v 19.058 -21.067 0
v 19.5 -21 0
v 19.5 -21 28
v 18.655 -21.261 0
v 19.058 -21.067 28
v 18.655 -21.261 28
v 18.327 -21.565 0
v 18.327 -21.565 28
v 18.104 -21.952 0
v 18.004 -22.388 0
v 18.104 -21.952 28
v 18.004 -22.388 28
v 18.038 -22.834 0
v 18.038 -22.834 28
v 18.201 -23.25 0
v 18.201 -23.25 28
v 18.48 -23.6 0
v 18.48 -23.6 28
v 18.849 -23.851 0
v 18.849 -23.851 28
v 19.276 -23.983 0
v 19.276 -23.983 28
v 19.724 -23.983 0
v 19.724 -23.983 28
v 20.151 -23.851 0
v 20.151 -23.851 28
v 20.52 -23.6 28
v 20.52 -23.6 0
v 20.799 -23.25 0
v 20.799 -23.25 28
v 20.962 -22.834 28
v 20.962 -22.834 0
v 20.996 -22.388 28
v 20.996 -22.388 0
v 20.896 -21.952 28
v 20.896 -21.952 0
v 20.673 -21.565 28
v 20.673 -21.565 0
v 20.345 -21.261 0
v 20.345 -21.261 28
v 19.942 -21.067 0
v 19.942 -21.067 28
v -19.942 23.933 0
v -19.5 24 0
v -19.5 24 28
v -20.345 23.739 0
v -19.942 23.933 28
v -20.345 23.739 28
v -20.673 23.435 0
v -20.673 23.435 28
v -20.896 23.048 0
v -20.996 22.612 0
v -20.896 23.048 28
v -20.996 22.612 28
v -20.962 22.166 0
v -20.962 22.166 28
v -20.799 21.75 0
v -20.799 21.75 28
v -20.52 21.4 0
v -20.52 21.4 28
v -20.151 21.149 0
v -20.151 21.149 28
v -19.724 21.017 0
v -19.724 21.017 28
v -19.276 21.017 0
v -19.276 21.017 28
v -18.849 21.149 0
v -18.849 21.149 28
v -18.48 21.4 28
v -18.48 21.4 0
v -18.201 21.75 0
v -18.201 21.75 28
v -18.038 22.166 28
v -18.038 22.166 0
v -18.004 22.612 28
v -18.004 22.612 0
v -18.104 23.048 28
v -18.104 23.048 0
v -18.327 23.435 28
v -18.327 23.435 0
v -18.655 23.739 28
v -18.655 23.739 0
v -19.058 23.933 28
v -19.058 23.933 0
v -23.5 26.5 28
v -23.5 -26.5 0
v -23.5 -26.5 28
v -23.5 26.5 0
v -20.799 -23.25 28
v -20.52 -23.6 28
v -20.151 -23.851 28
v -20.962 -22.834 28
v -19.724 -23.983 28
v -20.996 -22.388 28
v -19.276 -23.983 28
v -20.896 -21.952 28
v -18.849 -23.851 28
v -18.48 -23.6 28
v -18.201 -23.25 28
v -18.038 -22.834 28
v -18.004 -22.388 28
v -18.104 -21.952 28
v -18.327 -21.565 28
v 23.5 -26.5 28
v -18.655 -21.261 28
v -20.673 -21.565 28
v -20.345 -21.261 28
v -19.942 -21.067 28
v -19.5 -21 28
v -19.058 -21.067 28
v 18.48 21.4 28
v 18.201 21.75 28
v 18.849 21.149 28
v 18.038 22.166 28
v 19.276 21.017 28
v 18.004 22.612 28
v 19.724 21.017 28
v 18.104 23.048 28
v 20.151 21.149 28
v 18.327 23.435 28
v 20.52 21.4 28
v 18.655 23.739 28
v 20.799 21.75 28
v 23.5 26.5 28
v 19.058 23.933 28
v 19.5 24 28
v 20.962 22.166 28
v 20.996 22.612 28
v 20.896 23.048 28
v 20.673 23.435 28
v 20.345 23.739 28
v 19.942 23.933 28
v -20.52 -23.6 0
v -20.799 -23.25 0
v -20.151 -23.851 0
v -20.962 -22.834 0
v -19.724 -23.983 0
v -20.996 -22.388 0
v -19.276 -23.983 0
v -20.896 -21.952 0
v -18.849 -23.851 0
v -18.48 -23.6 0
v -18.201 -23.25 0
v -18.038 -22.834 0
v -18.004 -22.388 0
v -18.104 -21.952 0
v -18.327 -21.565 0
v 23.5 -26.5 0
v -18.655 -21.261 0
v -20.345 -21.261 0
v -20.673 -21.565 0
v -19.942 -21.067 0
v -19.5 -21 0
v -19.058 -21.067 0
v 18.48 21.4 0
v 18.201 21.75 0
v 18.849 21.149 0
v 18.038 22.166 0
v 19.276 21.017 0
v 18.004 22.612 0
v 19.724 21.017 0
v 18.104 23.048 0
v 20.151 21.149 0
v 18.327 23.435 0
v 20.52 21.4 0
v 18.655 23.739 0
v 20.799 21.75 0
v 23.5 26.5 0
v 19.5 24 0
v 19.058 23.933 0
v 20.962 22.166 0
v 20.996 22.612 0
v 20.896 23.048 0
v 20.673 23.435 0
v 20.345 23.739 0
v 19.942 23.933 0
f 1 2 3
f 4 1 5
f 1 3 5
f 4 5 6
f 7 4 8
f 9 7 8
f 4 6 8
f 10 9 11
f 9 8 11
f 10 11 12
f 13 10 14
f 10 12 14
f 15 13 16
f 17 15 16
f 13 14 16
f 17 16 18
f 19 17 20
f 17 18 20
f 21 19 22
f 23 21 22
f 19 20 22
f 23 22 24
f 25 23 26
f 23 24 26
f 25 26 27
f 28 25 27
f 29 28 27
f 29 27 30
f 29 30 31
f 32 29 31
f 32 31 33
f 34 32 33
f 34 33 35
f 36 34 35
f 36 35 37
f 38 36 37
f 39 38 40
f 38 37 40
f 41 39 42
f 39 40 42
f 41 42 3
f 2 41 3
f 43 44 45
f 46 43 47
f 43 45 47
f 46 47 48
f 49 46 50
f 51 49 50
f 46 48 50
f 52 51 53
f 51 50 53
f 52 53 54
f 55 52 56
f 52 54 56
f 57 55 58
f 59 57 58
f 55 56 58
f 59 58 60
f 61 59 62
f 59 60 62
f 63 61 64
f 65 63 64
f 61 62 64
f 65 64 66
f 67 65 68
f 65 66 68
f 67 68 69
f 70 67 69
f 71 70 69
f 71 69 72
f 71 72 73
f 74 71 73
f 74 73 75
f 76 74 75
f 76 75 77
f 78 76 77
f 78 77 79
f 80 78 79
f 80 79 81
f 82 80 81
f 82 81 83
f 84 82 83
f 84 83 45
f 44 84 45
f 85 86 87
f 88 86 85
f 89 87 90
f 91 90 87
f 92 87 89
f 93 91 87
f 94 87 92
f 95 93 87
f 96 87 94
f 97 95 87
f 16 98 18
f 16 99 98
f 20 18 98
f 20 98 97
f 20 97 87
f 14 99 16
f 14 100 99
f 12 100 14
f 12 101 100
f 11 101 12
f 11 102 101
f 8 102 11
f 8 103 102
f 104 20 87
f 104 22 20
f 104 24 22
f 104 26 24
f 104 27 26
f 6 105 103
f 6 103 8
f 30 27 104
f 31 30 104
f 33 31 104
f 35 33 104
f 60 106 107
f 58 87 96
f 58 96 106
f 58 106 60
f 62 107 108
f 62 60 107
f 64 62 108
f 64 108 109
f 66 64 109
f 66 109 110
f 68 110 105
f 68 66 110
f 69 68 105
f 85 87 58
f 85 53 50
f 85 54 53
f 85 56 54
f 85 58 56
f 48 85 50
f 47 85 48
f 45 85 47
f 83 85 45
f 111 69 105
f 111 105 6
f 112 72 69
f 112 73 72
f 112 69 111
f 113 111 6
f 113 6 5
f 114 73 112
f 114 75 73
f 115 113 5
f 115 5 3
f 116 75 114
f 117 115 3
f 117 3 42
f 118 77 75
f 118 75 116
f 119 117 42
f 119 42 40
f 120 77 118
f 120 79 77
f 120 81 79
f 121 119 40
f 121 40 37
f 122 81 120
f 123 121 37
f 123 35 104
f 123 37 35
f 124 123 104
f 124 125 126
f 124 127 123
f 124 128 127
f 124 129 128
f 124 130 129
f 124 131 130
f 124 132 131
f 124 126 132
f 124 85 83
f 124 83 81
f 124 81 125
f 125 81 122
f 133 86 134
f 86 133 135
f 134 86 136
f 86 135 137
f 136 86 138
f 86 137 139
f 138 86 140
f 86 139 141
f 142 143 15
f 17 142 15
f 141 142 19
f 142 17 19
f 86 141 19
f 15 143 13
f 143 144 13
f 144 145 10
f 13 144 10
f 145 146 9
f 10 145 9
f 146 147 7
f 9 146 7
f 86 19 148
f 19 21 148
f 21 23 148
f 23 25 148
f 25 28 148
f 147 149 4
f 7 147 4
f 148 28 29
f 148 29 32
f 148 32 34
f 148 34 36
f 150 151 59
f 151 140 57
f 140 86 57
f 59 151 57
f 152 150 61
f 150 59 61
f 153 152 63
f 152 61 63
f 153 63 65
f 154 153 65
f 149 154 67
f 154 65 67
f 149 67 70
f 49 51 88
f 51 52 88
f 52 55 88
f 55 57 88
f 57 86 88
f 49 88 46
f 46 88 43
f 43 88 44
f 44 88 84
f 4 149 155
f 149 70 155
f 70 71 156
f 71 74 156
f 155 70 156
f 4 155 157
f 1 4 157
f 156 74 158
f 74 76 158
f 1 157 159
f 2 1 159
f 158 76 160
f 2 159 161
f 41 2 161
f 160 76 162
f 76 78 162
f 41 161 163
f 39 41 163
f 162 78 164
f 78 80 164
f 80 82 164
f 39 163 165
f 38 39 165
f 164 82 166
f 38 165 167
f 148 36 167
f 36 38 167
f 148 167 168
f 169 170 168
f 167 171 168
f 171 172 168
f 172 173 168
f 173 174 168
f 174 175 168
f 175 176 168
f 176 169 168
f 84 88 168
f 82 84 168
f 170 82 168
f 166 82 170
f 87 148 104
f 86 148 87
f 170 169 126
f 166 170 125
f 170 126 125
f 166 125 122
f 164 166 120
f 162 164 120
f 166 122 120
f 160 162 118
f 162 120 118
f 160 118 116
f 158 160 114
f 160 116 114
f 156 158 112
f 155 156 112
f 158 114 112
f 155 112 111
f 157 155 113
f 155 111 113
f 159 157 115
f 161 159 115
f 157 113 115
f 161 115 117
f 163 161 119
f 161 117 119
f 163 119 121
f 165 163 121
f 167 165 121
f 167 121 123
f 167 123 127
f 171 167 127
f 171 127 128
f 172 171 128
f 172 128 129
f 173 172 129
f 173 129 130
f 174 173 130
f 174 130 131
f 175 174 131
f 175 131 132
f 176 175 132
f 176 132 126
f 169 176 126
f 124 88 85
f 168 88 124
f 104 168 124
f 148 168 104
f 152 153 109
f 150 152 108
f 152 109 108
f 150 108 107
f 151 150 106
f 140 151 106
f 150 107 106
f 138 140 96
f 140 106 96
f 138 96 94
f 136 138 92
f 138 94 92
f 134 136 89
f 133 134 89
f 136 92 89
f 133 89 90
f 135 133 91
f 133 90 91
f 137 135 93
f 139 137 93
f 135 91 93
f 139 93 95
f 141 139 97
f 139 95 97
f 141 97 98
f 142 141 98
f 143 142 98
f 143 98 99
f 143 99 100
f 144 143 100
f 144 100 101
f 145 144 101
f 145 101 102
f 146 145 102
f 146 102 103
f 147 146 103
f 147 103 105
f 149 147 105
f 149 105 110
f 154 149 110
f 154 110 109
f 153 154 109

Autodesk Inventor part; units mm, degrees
ref_plane "YZ Plane" through (0, 0, 0) normal (1, 0, 0) x (0, 1, 0)
ref_plane "XZ Plane" through (0, 0, 0) normal (0, 1, 0) x (-1, 0, 0)
ref_plane "XY Plane" through (0, 0, 0) normal (0, 0, 1) x (1, 0, 0)
sketch "スケッチ1" plane through (0, 0, 0) normal (0, 0, 1) x (1, 0, 0)
  line L0 (-23.5, 26.5) -> (23.5, 26.5)
  line L1 (23.5, 26.5) -> (23.5, -26.5)
  line L2 (23.5, -26.5) -> (-23.5, -26.5)
  line L3 (-23.5, -26.5) -> (-23.5, 26.5)
  line L4 (-23.5, 26.5) -> (23.5, -26.5) construction
  line L5 (23.5, 26.5) -> (-23.5, -26.5) construction
  point P0 (0, 0)
  dimension "d0" = 47
  dimension "d1" = 53
extrude "押し出し1" add sketch "スケッチ1" along normal blind 28
sketch "スケッチ2" plane through (0, 0, 0) normal (0, 0, -1) x (-1, 0, 0)
  line L0 (23.5, -26.5) -> (23.5, 26.5) projected
  line L1 (23.5, -26.5) -> (-23.5, -26.5) projected
  line L2 (23.5, 26.5) -> (-23.5, 26.5) projected
  line L3 (-23.5, 26.5) -> (-23.5, -26.5) projected
  point P0 (0, 0)
  point P1 (19.5, -22.5)
  point P2 (19.5, 22.5)
  point P3 (-19.5, 22.5)
  point P4 (-19.5, -22.5)
  dimension "d4" = 4
  dimension "d5" = 4
  dimension "d6" = 4
  dimension "d7" = 4
hole "穴1" at (-19.5, -22.5, 0) at (-19.5, 22.5, 0) at (19.5, 22.5, 0) at (19.5, -22.5, 0) direction (0, 0, 1) diameter 3 end through all
properties part number "Motor board ver2"
